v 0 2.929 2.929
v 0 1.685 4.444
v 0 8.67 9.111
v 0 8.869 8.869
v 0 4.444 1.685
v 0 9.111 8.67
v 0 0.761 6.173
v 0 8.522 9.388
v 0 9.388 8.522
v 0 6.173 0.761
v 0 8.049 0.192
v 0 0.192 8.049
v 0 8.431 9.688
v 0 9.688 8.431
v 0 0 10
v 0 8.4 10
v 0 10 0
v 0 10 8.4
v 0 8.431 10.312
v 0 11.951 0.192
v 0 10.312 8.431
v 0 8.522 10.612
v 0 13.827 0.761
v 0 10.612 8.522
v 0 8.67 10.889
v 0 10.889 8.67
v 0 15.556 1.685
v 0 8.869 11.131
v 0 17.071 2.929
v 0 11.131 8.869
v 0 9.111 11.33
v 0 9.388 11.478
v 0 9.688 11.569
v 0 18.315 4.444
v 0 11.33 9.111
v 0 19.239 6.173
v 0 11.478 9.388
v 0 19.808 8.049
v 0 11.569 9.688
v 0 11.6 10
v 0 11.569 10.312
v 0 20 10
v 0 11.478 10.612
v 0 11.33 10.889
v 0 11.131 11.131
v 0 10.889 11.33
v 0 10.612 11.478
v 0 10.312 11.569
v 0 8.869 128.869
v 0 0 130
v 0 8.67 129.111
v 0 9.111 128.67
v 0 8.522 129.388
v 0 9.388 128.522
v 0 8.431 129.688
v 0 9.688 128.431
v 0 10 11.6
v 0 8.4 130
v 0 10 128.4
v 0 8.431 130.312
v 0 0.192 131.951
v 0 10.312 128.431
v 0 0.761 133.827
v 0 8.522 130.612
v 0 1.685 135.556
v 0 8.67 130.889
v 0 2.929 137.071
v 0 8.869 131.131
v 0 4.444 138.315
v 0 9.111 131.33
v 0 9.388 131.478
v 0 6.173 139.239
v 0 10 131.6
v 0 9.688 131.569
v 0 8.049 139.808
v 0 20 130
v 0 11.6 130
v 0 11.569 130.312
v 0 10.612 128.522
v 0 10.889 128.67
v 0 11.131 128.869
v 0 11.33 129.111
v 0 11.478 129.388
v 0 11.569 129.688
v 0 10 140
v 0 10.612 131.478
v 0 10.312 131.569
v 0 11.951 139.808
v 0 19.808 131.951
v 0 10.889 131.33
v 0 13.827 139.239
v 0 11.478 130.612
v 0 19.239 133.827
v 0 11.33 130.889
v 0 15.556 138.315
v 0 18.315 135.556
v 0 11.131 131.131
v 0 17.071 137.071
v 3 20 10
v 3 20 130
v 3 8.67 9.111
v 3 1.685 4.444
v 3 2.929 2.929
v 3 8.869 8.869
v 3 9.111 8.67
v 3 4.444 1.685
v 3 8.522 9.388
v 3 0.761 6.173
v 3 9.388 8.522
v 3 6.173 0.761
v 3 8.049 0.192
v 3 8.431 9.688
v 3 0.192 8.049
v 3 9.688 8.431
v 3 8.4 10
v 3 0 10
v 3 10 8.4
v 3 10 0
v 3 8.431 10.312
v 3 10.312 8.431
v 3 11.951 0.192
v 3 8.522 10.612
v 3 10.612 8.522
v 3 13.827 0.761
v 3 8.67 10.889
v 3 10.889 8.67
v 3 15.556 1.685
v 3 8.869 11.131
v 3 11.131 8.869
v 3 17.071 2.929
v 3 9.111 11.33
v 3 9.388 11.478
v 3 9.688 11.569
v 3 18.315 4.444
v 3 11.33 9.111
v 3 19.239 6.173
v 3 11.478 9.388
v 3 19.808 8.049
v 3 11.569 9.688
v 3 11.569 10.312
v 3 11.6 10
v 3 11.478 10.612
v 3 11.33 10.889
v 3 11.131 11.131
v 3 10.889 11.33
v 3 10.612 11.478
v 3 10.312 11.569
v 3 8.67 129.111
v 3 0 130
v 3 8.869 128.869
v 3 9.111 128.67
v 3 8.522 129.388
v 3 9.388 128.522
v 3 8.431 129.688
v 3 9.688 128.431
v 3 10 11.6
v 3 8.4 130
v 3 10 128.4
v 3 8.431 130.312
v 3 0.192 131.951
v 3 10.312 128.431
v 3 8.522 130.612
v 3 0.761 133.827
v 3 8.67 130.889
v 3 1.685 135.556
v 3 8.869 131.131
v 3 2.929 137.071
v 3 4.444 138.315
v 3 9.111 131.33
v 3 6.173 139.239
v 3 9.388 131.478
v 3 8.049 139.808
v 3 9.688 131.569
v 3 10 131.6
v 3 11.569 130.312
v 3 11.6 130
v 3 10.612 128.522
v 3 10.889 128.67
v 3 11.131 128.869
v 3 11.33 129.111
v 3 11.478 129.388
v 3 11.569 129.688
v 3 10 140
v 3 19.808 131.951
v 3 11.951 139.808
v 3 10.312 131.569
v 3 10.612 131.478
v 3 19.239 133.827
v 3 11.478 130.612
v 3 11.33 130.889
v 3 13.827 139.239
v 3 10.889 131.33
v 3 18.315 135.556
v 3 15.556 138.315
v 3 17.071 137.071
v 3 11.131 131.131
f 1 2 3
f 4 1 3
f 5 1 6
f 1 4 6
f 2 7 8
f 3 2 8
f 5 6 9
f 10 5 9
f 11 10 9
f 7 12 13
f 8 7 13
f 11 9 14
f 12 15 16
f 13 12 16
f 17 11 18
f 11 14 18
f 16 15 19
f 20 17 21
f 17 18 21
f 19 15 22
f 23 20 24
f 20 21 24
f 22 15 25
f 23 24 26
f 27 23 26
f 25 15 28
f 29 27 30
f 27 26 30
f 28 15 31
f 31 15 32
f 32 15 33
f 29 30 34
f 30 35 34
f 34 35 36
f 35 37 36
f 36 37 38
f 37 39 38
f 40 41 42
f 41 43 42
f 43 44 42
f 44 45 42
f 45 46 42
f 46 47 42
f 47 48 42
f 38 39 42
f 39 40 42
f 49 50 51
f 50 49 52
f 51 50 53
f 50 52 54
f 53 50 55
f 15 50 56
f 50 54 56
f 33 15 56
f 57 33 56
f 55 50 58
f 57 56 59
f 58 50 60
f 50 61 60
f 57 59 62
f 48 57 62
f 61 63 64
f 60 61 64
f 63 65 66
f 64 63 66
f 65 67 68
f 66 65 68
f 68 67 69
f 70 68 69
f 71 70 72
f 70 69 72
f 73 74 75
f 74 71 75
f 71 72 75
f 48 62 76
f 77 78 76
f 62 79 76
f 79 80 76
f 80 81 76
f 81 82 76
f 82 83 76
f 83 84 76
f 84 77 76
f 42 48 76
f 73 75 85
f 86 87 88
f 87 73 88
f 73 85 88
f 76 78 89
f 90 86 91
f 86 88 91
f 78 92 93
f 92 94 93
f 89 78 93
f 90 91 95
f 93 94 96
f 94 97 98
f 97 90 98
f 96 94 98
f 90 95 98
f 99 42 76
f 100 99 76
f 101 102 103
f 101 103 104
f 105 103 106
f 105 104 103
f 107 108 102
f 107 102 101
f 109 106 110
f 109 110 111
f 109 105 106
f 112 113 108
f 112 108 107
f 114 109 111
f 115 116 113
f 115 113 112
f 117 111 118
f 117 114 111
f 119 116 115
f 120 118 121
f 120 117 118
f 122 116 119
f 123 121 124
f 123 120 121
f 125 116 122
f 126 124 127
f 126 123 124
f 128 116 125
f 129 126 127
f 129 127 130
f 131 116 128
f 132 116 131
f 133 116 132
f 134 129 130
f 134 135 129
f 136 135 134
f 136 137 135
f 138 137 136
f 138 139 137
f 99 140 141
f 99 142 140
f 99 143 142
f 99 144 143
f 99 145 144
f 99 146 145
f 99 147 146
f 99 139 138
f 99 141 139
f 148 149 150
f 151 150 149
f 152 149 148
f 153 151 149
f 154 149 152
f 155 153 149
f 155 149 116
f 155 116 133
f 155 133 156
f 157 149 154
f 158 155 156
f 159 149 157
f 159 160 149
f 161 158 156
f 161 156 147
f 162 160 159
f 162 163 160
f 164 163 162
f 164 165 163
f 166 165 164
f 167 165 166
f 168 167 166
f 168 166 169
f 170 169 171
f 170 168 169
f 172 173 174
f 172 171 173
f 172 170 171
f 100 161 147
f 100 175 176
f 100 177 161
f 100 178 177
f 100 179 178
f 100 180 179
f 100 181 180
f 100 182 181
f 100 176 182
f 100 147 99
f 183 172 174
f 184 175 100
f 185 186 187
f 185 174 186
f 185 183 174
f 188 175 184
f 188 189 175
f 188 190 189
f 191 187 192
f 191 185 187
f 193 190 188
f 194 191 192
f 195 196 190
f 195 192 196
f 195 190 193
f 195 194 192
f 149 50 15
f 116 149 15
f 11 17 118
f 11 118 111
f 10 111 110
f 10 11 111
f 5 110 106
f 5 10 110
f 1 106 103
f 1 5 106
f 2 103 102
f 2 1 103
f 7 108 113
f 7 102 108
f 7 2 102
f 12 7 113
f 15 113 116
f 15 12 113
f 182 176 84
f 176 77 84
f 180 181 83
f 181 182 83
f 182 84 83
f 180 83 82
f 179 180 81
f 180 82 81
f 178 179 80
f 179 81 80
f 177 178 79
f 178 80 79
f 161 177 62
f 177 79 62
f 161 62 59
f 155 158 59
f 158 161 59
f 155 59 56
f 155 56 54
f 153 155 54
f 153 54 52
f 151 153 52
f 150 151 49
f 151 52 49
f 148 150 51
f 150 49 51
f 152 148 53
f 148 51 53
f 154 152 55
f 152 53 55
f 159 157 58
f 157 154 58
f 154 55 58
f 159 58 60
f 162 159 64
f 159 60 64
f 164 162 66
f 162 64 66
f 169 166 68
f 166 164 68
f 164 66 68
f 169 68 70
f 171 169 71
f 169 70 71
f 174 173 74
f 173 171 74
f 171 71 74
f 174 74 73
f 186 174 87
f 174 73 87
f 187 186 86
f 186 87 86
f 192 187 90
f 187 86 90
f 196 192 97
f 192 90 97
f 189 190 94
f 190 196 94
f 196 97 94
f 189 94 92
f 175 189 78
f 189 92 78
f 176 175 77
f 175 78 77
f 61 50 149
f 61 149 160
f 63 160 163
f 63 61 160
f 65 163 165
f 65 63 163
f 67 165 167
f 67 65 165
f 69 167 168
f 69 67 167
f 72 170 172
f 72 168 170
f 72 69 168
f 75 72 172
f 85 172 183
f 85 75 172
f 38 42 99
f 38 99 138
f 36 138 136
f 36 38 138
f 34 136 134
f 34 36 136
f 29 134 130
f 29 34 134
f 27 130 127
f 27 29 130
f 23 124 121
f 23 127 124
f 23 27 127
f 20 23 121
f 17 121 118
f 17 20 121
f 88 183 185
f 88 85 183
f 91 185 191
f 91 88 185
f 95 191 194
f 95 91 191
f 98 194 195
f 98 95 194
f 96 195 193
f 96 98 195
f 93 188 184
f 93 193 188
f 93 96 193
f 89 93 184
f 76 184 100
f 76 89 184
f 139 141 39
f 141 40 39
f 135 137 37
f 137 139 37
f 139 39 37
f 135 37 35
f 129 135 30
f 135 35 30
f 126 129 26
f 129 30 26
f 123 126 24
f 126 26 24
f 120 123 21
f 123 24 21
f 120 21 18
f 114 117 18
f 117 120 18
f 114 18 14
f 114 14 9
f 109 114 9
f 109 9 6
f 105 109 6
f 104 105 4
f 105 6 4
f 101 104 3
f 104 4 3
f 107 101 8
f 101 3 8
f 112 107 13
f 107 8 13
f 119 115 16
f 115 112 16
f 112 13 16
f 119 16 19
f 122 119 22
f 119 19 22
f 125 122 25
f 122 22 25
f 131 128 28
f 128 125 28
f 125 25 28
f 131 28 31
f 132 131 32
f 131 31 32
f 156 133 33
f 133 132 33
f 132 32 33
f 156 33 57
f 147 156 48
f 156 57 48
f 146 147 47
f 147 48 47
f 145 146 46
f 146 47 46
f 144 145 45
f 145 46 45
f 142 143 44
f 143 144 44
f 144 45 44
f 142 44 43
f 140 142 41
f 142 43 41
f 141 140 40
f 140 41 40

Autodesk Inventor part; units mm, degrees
ref_plane "YZ Plane" through (0, 0, 0) normal (1, 0, 0) x (0, 1, 0)
ref_plane "XZ Plane" through (0, 0, 0) normal (0, 1, 0) x (-1, 0, 0)
ref_plane "XY Plane" through (0, 0, 0) normal (0, 0, 1) x (1, 0, 0)
sketch "Szkic1" plane through (0, 0, 0) normal (1, 0, 0) x (0, 1, 0)
  line L0 (10, 0) -> (10, 0)
  line L1 (20, 10) -> (20, 130)
  line L2 (10, 140) -> (10, 140)
  line L3 (0, 130) -> (0, 10)
  arc A0 (20, 130) -> (10, 140) centre (10, 130) ccw
  arc A1 (10, 140) -> (0, 130) centre (10, 130) ccw
  arc A2 (10, 0) -> (20, 10) centre (10, 10) ccw
  arc A3 (0, 10) -> (10, 0) centre (10, 10) ccw
  circle A4 centre (10, 130) radius 1.6
  circle A5 centre (10, 10) radius 1.6
  point P0 (0, 0)
  point P1 (20, 140)
  point P2 (0, 140)
  dimension "d0" = 20
  dimension "d1" = 10
  dimension "d2" = 10
  dimension "d3" = 10
  dimension "d4" = 10
  dimension "d5" = 3.2
  dimension "d6" = 3.2
  dimension "d7" = 120
extrude "Wyciągnięcie proste1" add sketch "Szkic1" along normal blind 3
properties part number "segment1"
